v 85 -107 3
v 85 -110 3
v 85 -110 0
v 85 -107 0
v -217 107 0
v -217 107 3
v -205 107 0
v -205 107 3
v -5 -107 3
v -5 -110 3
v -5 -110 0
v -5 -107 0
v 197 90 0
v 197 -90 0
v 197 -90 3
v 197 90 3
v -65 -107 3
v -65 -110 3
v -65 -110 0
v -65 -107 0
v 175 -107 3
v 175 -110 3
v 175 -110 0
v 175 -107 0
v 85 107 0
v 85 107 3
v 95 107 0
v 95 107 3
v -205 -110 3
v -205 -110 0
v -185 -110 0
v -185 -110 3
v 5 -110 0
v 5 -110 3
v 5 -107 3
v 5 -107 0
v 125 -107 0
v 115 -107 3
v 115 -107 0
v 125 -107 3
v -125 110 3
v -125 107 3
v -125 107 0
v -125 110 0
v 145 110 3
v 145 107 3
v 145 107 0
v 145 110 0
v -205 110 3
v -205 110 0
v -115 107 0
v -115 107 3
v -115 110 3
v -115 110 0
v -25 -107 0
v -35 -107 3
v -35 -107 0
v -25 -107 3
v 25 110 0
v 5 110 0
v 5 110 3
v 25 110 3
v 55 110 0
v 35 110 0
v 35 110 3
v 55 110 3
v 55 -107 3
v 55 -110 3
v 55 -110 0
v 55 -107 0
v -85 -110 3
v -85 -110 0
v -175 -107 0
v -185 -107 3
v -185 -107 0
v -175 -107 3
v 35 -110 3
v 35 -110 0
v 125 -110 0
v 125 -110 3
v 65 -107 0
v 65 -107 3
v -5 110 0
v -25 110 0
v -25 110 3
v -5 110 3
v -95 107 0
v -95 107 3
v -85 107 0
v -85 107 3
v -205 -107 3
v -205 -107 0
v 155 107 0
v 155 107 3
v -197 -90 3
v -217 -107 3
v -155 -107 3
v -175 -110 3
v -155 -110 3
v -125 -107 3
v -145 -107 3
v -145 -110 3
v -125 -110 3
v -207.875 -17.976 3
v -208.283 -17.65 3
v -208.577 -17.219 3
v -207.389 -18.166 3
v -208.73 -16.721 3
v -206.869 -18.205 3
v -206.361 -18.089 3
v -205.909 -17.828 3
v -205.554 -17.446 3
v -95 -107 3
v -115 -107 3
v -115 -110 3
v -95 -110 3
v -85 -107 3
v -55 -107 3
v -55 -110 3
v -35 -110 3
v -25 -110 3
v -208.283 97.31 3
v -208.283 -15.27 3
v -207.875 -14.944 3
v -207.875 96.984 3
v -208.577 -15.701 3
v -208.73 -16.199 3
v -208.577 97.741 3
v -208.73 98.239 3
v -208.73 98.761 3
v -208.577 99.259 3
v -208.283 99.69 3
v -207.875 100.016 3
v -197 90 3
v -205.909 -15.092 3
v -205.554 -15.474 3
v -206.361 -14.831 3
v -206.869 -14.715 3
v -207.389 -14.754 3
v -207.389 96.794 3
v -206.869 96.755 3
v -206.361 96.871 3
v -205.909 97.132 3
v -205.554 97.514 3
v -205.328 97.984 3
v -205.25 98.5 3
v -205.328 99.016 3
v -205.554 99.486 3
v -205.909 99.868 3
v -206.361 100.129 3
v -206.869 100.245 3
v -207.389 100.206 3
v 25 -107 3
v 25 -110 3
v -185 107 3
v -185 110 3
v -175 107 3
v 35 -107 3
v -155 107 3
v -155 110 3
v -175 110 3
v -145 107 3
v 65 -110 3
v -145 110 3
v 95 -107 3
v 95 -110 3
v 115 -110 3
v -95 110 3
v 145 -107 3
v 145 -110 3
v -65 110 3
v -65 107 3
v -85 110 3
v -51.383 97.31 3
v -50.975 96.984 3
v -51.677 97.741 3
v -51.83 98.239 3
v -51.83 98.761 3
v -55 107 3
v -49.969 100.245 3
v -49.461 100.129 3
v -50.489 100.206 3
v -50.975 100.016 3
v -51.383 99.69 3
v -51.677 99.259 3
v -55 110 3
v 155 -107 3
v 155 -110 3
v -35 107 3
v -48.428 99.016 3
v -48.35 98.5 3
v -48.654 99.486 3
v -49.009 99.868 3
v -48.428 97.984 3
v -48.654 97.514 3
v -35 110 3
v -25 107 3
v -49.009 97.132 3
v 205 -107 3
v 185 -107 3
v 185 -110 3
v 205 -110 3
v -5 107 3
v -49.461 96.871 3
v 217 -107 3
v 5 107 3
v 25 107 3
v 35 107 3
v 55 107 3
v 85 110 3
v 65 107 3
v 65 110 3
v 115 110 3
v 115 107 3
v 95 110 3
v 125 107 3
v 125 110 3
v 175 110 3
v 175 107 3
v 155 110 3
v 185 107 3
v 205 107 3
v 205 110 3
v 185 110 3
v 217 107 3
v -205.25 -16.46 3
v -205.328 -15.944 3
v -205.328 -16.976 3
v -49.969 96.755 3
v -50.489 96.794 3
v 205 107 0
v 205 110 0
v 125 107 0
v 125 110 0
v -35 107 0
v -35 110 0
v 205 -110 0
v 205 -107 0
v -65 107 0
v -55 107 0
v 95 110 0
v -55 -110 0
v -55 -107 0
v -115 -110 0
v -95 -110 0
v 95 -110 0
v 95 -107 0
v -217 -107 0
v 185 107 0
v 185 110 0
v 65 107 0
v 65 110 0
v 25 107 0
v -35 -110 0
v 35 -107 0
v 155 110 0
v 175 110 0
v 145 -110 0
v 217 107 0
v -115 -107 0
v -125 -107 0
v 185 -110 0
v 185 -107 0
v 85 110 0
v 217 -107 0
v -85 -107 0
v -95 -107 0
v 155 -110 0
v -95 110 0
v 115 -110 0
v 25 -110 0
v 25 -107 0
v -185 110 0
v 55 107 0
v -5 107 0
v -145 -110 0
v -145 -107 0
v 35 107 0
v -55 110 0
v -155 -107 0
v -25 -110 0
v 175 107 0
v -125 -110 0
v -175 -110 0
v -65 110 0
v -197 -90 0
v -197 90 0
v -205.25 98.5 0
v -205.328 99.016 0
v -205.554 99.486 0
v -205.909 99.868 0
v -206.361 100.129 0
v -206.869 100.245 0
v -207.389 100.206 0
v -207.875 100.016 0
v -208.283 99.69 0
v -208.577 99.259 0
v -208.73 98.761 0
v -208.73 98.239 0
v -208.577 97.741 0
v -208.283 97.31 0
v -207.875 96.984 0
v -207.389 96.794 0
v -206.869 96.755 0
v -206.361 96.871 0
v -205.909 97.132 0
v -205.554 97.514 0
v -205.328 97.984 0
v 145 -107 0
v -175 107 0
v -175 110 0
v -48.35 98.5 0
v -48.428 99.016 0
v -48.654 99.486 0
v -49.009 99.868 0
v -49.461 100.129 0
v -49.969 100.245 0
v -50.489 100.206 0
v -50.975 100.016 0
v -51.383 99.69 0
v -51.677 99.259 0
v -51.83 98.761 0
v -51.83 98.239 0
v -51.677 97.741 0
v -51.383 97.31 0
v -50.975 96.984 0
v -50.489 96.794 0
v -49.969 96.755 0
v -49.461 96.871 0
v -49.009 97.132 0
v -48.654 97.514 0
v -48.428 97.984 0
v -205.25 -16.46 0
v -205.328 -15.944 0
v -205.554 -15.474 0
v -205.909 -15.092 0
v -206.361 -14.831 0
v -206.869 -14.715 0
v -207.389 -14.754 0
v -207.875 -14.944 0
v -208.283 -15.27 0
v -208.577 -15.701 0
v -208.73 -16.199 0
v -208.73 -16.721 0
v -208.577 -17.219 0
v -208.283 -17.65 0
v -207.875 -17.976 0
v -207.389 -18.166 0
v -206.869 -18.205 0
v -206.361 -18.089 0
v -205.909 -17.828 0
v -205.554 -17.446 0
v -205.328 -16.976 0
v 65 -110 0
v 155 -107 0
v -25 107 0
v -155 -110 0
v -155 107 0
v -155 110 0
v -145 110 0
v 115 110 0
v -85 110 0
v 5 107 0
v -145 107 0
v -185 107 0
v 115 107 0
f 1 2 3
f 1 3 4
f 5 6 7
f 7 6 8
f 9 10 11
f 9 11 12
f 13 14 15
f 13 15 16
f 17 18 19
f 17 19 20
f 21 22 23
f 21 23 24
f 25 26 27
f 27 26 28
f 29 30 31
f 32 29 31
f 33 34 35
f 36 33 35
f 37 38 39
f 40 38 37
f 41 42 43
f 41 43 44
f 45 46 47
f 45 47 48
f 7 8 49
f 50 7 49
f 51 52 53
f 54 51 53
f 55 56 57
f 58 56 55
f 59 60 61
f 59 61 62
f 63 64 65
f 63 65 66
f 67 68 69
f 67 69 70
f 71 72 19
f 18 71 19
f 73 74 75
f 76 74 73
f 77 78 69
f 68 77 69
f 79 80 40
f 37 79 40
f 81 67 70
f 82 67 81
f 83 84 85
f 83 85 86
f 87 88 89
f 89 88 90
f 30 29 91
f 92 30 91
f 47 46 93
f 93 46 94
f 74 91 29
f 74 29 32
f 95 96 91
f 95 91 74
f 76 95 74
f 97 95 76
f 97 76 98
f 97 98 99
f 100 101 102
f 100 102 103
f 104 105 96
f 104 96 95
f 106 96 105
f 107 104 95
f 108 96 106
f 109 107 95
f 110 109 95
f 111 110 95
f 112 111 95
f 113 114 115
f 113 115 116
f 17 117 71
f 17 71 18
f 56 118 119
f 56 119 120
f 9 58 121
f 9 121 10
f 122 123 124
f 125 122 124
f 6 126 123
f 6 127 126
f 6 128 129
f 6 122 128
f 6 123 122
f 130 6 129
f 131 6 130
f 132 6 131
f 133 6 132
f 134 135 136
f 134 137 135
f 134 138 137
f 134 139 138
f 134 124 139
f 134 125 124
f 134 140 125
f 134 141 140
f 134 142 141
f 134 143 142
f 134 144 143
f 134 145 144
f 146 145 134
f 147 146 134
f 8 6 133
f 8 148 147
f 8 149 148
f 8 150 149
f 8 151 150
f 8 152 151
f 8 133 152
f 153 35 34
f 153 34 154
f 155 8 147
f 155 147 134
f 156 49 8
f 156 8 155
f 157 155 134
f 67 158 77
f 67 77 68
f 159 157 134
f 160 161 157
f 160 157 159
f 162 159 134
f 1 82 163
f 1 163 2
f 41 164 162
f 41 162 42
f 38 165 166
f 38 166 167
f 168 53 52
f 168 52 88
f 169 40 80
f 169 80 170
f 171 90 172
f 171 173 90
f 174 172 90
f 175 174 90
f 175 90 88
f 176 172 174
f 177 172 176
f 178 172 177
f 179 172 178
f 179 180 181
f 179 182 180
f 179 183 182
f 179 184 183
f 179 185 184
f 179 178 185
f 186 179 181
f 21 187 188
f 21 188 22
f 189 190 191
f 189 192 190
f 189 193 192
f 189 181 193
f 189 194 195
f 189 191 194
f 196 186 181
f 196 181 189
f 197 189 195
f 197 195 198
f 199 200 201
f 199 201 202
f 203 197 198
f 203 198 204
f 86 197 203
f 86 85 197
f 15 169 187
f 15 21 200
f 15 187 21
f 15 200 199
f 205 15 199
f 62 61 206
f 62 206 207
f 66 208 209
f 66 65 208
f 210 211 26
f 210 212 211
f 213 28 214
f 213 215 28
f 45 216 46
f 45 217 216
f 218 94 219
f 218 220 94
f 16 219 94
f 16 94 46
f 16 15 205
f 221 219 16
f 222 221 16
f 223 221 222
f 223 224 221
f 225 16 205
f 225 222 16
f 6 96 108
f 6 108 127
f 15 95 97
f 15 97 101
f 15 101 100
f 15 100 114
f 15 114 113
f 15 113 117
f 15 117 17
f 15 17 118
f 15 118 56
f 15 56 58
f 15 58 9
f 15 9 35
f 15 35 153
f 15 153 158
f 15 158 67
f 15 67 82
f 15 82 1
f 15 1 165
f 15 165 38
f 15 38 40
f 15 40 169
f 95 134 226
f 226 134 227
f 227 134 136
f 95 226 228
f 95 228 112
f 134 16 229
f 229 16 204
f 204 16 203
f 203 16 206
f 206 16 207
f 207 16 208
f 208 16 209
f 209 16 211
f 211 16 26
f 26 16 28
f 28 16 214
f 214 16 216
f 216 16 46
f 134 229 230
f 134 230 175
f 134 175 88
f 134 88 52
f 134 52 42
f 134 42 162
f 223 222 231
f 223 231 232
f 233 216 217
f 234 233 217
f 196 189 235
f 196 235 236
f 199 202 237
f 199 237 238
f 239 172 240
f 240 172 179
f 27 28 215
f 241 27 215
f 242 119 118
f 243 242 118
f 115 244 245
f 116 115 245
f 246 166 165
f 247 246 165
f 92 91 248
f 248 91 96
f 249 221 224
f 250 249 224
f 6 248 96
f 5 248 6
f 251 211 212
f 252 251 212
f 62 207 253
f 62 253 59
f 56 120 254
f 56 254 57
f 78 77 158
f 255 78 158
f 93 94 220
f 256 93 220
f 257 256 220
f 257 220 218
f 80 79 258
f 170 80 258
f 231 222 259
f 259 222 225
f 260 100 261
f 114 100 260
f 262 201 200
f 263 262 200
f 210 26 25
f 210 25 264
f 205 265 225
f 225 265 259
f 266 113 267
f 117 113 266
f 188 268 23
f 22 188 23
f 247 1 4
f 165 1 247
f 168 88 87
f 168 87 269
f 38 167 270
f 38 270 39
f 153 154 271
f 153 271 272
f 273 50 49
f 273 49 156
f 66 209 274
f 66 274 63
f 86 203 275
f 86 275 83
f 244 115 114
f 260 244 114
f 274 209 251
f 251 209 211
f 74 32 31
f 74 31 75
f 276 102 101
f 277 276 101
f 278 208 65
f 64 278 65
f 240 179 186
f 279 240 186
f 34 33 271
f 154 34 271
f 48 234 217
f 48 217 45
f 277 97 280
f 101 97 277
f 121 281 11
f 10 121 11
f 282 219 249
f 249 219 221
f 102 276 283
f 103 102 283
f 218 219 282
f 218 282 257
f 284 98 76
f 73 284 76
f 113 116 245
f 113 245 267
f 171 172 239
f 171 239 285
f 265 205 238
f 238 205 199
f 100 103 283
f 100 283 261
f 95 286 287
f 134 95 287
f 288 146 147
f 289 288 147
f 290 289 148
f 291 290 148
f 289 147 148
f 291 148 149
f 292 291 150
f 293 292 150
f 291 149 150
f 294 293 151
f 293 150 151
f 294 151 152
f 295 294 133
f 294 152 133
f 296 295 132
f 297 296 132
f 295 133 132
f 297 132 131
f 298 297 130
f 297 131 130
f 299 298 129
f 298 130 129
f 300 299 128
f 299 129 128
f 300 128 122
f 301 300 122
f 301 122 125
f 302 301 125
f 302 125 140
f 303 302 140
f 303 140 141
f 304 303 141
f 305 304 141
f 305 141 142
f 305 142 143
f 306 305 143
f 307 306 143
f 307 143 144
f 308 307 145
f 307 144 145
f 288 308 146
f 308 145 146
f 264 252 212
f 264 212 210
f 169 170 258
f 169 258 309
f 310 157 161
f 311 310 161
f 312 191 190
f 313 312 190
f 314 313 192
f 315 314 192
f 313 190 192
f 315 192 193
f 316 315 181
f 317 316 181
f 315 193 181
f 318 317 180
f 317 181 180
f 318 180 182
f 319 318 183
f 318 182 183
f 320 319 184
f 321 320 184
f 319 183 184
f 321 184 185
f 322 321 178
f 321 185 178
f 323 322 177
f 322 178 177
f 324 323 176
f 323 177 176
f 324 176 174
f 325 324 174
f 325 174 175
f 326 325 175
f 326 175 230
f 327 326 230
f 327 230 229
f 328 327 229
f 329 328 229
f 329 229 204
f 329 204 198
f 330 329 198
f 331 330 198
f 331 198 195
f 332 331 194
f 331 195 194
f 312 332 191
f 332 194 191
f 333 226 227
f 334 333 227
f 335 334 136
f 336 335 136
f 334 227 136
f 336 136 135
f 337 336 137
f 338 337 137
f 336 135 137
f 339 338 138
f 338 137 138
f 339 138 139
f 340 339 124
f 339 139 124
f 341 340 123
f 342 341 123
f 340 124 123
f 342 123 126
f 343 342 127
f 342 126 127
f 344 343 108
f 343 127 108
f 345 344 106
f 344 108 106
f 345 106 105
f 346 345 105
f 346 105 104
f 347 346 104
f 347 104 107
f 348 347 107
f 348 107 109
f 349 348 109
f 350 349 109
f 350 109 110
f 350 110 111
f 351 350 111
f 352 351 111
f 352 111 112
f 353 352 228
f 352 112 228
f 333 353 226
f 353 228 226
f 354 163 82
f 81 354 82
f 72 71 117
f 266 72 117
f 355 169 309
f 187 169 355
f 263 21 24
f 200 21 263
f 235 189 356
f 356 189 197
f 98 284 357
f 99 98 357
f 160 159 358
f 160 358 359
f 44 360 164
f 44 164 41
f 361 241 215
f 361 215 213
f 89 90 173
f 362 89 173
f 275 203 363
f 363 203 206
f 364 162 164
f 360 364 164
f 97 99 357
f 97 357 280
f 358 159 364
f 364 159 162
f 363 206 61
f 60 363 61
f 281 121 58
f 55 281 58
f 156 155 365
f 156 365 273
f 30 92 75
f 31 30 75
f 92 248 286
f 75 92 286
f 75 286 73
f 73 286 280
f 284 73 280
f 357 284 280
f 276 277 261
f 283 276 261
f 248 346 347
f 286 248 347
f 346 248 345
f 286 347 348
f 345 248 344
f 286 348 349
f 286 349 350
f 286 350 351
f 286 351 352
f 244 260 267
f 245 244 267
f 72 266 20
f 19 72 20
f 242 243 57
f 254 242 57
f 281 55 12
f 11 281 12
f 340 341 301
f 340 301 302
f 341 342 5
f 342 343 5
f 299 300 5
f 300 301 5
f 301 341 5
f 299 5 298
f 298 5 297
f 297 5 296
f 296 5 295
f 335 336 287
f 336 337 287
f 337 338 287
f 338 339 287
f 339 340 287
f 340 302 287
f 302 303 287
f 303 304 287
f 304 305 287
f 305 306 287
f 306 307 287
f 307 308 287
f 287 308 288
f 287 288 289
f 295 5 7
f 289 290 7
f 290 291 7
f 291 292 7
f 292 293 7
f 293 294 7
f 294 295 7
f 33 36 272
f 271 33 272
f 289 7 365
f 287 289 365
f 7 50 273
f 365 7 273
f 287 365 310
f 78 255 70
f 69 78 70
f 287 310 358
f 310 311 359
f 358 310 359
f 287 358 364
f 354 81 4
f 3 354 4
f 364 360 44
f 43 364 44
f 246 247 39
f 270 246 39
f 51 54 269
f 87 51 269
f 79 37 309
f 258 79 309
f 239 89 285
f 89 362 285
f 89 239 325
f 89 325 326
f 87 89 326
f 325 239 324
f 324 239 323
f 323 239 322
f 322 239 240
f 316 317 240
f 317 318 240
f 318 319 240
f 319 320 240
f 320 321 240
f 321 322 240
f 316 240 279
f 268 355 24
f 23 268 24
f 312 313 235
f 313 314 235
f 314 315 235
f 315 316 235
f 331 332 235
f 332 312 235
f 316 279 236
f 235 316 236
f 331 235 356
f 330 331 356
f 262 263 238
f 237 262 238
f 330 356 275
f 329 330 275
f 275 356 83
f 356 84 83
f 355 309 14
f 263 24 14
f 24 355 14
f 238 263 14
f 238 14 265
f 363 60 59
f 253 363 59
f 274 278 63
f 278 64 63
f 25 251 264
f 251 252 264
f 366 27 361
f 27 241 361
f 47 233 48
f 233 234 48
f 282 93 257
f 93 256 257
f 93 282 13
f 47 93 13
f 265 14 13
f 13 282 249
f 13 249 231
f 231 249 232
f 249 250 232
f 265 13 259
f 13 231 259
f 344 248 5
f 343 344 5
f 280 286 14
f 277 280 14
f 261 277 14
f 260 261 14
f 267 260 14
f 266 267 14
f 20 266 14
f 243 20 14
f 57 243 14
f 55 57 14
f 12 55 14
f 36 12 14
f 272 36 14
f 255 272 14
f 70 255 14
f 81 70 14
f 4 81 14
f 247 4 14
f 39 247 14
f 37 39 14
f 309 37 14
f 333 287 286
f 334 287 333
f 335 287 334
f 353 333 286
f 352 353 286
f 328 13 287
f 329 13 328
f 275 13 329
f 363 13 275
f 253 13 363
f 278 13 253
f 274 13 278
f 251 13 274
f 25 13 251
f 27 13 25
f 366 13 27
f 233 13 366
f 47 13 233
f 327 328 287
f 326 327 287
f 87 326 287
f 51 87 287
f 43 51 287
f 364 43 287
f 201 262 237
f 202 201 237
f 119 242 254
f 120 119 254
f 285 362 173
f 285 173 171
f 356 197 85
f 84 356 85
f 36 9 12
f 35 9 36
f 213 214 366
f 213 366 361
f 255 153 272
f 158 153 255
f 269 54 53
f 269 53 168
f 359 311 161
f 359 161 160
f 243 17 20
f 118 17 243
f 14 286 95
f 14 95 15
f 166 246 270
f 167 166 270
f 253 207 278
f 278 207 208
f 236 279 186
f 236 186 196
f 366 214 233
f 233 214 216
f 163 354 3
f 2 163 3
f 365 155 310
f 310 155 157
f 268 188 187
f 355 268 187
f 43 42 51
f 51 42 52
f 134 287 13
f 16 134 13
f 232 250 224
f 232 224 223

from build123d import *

# Parameters (mm, degrees)
ESQUISSE1_W             = 434
ESQUISSE1_H             = 220
ESQUISSE1_W_2           = 394
ESQUISSE1_H_2           = 180
BOSS_EXTRU_1_DEPTH      = 3
ESQUISSE2_W             = 10
ESQUISSE2_H             = 3
ESQUISSE2_W_2           = 2
ENL_V_MAT_EXTRU_1_DEPTH = 3
ESQUISSE3_R             = 1.75
ENL_V_MAT_EXTRU_2_DEPTH = 3


with BuildPart() as part:
    # Esquisse1 → Boss.-Extru.1 (new body)
    with BuildSketch(Plane.XY):
        Rectangle(ESQUISSE1_W, ESQUISSE1_H)
        Rectangle(ESQUISSE1_W_2, ESQUISSE1_H_2, mode=Mode.SUBTRACT)
    extrude(amount=BOSS_EXTRU_1_DEPTH)

    # Esquisse2 → Enlèv. mat.-Extru.1 (cut)
    with BuildSketch(Plane.XY.offset(3)):
        with Locations((-210, 108.5)):
            Rectangle(ESQUISSE2_W, ESQUISSE2_H)
        with Locations((-180, 108.5)):
            Rectangle(ESQUISSE2_W, ESQUISSE2_H)
        with Locations((-150, 108.5)):
            Rectangle(ESQUISSE2_W, ESQUISSE2_H)
        with Locations((-120, 108.5)):
            Rectangle(ESQUISSE2_W, ESQUISSE2_H)
        with Locations((-90, 108.5)):
            Rectangle(ESQUISSE2_W, ESQUISSE2_H)
        with Locations((-30, 108.5)):
            Rectangle(ESQUISSE2_W, ESQUISSE2_H)
        with Locations((30, 108.5)):
            Rectangle(ESQUISSE2_W, ESQUISSE2_H)
        with Locations((60, 108.5)):
            Rectangle(ESQUISSE2_W, ESQUISSE2_H)
        with Locations((90, 108.5)):
            Rectangle(ESQUISSE2_W, ESQUISSE2_H)
        with Locations((120, 108.5)):
            Rectangle(ESQUISSE2_W, ESQUISSE2_H)
        with Locations((150, 108.5)):
            Rectangle(ESQUISSE2_W, ESQUISSE2_H)
        with Locations((180, 108.5)):
            Rectangle(ESQUISSE2_W, ESQUISSE2_H)
        with Locations((210, 108.5)):
            Rectangle(ESQUISSE2_W, ESQUISSE2_H)
        with Locations((210, -108.5)):
            Rectangle(ESQUISSE2_W, ESQUISSE2_H)
        with Locations((180, -108.5)):
            Rectangle(ESQUISSE2_W, ESQUISSE2_H)
        with Locations((150, -108.5)):
            Rectangle(ESQUISSE2_W, ESQUISSE2_H)
        with Locations((90, -108.5)):
            Rectangle(ESQUISSE2_W, ESQUISSE2_H)
        with Locations((60, -108.5)):
            Rectangle(ESQUISSE2_W, ESQUISSE2_H)
        with Locations((-30, -108.5)):
            Rectangle(ESQUISSE2_W, ESQUISSE2_H)
        with Locations((-60, -108.5)):
            Rectangle(ESQUISSE2_W, ESQUISSE2_H)
        with Locations((-90, -108.5)):
            Rectangle(ESQUISSE2_W, ESQUISSE2_H)
        with Locations((-120, -108.5)):
            Rectangle(ESQUISSE2_W, ESQUISSE2_H)
        with Locations((-150, -108.5)):
            Rectangle(ESQUISSE2_W, ESQUISSE2_H)
        with Locations((-210, -108.5)):
            Rectangle(ESQUISSE2_W, ESQUISSE2_H)
        with Locations((-180, -108.5)):
            Rectangle(ESQUISSE2_W, ESQUISSE2_H)
        with Locations((-216, -108.5)):
            Rectangle(ESQUISSE2_W_2, ESQUISSE2_H)
        with Locations((-216, 108.5)):
            Rectangle(ESQUISSE2_W_2, ESQUISSE2_H)
        with Locations((-60, 108.5)):
            Rectangle(ESQUISSE2_W, ESQUISSE2_H)
        with Locations((0, 108.5)):
            Rectangle(ESQUISSE2_W, ESQUISSE2_H)
        with Locations((120, -108.5)):
            Rectangle(ESQUISSE2_W, ESQUISSE2_H)
        with Locations((30, -108.5)):
            Rectangle(ESQUISSE2_W, ESQUISSE2_H)
        with Locations((0, -108.5)):
            Rectangle(ESQUISSE2_W, ESQUISSE2_H)
        with Locations((216, 108.5)):
            Rectangle(ESQUISSE2_W_2, ESQUISSE2_H)
        with Locations((216, -108.5)):
            Rectangle(ESQUISSE2_W_2, ESQUISSE2_H)
    extrude(amount=-ENL_V_MAT_EXTRU_1_DEPTH, mode=Mode.SUBTRACT)

    # Esquisse3 → Enlèv. mat.-Extru.2 (cut)
    with BuildSketch(Plane.XY.offset(3)):
        with Locations((-207, 98.5)):
            Circle(ESQUISSE3_R)
        with Locations((-50.1, 98.5)):
            Circle(ESQUISSE3_R)
        with Locations((-207, -16.46)):
            Circle(ESQUISSE3_R)
    extrude(amount=-ENL_V_MAT_EXTRU_2_DEPTH, mode=Mode.SUBTRACT)


solid = part.part
